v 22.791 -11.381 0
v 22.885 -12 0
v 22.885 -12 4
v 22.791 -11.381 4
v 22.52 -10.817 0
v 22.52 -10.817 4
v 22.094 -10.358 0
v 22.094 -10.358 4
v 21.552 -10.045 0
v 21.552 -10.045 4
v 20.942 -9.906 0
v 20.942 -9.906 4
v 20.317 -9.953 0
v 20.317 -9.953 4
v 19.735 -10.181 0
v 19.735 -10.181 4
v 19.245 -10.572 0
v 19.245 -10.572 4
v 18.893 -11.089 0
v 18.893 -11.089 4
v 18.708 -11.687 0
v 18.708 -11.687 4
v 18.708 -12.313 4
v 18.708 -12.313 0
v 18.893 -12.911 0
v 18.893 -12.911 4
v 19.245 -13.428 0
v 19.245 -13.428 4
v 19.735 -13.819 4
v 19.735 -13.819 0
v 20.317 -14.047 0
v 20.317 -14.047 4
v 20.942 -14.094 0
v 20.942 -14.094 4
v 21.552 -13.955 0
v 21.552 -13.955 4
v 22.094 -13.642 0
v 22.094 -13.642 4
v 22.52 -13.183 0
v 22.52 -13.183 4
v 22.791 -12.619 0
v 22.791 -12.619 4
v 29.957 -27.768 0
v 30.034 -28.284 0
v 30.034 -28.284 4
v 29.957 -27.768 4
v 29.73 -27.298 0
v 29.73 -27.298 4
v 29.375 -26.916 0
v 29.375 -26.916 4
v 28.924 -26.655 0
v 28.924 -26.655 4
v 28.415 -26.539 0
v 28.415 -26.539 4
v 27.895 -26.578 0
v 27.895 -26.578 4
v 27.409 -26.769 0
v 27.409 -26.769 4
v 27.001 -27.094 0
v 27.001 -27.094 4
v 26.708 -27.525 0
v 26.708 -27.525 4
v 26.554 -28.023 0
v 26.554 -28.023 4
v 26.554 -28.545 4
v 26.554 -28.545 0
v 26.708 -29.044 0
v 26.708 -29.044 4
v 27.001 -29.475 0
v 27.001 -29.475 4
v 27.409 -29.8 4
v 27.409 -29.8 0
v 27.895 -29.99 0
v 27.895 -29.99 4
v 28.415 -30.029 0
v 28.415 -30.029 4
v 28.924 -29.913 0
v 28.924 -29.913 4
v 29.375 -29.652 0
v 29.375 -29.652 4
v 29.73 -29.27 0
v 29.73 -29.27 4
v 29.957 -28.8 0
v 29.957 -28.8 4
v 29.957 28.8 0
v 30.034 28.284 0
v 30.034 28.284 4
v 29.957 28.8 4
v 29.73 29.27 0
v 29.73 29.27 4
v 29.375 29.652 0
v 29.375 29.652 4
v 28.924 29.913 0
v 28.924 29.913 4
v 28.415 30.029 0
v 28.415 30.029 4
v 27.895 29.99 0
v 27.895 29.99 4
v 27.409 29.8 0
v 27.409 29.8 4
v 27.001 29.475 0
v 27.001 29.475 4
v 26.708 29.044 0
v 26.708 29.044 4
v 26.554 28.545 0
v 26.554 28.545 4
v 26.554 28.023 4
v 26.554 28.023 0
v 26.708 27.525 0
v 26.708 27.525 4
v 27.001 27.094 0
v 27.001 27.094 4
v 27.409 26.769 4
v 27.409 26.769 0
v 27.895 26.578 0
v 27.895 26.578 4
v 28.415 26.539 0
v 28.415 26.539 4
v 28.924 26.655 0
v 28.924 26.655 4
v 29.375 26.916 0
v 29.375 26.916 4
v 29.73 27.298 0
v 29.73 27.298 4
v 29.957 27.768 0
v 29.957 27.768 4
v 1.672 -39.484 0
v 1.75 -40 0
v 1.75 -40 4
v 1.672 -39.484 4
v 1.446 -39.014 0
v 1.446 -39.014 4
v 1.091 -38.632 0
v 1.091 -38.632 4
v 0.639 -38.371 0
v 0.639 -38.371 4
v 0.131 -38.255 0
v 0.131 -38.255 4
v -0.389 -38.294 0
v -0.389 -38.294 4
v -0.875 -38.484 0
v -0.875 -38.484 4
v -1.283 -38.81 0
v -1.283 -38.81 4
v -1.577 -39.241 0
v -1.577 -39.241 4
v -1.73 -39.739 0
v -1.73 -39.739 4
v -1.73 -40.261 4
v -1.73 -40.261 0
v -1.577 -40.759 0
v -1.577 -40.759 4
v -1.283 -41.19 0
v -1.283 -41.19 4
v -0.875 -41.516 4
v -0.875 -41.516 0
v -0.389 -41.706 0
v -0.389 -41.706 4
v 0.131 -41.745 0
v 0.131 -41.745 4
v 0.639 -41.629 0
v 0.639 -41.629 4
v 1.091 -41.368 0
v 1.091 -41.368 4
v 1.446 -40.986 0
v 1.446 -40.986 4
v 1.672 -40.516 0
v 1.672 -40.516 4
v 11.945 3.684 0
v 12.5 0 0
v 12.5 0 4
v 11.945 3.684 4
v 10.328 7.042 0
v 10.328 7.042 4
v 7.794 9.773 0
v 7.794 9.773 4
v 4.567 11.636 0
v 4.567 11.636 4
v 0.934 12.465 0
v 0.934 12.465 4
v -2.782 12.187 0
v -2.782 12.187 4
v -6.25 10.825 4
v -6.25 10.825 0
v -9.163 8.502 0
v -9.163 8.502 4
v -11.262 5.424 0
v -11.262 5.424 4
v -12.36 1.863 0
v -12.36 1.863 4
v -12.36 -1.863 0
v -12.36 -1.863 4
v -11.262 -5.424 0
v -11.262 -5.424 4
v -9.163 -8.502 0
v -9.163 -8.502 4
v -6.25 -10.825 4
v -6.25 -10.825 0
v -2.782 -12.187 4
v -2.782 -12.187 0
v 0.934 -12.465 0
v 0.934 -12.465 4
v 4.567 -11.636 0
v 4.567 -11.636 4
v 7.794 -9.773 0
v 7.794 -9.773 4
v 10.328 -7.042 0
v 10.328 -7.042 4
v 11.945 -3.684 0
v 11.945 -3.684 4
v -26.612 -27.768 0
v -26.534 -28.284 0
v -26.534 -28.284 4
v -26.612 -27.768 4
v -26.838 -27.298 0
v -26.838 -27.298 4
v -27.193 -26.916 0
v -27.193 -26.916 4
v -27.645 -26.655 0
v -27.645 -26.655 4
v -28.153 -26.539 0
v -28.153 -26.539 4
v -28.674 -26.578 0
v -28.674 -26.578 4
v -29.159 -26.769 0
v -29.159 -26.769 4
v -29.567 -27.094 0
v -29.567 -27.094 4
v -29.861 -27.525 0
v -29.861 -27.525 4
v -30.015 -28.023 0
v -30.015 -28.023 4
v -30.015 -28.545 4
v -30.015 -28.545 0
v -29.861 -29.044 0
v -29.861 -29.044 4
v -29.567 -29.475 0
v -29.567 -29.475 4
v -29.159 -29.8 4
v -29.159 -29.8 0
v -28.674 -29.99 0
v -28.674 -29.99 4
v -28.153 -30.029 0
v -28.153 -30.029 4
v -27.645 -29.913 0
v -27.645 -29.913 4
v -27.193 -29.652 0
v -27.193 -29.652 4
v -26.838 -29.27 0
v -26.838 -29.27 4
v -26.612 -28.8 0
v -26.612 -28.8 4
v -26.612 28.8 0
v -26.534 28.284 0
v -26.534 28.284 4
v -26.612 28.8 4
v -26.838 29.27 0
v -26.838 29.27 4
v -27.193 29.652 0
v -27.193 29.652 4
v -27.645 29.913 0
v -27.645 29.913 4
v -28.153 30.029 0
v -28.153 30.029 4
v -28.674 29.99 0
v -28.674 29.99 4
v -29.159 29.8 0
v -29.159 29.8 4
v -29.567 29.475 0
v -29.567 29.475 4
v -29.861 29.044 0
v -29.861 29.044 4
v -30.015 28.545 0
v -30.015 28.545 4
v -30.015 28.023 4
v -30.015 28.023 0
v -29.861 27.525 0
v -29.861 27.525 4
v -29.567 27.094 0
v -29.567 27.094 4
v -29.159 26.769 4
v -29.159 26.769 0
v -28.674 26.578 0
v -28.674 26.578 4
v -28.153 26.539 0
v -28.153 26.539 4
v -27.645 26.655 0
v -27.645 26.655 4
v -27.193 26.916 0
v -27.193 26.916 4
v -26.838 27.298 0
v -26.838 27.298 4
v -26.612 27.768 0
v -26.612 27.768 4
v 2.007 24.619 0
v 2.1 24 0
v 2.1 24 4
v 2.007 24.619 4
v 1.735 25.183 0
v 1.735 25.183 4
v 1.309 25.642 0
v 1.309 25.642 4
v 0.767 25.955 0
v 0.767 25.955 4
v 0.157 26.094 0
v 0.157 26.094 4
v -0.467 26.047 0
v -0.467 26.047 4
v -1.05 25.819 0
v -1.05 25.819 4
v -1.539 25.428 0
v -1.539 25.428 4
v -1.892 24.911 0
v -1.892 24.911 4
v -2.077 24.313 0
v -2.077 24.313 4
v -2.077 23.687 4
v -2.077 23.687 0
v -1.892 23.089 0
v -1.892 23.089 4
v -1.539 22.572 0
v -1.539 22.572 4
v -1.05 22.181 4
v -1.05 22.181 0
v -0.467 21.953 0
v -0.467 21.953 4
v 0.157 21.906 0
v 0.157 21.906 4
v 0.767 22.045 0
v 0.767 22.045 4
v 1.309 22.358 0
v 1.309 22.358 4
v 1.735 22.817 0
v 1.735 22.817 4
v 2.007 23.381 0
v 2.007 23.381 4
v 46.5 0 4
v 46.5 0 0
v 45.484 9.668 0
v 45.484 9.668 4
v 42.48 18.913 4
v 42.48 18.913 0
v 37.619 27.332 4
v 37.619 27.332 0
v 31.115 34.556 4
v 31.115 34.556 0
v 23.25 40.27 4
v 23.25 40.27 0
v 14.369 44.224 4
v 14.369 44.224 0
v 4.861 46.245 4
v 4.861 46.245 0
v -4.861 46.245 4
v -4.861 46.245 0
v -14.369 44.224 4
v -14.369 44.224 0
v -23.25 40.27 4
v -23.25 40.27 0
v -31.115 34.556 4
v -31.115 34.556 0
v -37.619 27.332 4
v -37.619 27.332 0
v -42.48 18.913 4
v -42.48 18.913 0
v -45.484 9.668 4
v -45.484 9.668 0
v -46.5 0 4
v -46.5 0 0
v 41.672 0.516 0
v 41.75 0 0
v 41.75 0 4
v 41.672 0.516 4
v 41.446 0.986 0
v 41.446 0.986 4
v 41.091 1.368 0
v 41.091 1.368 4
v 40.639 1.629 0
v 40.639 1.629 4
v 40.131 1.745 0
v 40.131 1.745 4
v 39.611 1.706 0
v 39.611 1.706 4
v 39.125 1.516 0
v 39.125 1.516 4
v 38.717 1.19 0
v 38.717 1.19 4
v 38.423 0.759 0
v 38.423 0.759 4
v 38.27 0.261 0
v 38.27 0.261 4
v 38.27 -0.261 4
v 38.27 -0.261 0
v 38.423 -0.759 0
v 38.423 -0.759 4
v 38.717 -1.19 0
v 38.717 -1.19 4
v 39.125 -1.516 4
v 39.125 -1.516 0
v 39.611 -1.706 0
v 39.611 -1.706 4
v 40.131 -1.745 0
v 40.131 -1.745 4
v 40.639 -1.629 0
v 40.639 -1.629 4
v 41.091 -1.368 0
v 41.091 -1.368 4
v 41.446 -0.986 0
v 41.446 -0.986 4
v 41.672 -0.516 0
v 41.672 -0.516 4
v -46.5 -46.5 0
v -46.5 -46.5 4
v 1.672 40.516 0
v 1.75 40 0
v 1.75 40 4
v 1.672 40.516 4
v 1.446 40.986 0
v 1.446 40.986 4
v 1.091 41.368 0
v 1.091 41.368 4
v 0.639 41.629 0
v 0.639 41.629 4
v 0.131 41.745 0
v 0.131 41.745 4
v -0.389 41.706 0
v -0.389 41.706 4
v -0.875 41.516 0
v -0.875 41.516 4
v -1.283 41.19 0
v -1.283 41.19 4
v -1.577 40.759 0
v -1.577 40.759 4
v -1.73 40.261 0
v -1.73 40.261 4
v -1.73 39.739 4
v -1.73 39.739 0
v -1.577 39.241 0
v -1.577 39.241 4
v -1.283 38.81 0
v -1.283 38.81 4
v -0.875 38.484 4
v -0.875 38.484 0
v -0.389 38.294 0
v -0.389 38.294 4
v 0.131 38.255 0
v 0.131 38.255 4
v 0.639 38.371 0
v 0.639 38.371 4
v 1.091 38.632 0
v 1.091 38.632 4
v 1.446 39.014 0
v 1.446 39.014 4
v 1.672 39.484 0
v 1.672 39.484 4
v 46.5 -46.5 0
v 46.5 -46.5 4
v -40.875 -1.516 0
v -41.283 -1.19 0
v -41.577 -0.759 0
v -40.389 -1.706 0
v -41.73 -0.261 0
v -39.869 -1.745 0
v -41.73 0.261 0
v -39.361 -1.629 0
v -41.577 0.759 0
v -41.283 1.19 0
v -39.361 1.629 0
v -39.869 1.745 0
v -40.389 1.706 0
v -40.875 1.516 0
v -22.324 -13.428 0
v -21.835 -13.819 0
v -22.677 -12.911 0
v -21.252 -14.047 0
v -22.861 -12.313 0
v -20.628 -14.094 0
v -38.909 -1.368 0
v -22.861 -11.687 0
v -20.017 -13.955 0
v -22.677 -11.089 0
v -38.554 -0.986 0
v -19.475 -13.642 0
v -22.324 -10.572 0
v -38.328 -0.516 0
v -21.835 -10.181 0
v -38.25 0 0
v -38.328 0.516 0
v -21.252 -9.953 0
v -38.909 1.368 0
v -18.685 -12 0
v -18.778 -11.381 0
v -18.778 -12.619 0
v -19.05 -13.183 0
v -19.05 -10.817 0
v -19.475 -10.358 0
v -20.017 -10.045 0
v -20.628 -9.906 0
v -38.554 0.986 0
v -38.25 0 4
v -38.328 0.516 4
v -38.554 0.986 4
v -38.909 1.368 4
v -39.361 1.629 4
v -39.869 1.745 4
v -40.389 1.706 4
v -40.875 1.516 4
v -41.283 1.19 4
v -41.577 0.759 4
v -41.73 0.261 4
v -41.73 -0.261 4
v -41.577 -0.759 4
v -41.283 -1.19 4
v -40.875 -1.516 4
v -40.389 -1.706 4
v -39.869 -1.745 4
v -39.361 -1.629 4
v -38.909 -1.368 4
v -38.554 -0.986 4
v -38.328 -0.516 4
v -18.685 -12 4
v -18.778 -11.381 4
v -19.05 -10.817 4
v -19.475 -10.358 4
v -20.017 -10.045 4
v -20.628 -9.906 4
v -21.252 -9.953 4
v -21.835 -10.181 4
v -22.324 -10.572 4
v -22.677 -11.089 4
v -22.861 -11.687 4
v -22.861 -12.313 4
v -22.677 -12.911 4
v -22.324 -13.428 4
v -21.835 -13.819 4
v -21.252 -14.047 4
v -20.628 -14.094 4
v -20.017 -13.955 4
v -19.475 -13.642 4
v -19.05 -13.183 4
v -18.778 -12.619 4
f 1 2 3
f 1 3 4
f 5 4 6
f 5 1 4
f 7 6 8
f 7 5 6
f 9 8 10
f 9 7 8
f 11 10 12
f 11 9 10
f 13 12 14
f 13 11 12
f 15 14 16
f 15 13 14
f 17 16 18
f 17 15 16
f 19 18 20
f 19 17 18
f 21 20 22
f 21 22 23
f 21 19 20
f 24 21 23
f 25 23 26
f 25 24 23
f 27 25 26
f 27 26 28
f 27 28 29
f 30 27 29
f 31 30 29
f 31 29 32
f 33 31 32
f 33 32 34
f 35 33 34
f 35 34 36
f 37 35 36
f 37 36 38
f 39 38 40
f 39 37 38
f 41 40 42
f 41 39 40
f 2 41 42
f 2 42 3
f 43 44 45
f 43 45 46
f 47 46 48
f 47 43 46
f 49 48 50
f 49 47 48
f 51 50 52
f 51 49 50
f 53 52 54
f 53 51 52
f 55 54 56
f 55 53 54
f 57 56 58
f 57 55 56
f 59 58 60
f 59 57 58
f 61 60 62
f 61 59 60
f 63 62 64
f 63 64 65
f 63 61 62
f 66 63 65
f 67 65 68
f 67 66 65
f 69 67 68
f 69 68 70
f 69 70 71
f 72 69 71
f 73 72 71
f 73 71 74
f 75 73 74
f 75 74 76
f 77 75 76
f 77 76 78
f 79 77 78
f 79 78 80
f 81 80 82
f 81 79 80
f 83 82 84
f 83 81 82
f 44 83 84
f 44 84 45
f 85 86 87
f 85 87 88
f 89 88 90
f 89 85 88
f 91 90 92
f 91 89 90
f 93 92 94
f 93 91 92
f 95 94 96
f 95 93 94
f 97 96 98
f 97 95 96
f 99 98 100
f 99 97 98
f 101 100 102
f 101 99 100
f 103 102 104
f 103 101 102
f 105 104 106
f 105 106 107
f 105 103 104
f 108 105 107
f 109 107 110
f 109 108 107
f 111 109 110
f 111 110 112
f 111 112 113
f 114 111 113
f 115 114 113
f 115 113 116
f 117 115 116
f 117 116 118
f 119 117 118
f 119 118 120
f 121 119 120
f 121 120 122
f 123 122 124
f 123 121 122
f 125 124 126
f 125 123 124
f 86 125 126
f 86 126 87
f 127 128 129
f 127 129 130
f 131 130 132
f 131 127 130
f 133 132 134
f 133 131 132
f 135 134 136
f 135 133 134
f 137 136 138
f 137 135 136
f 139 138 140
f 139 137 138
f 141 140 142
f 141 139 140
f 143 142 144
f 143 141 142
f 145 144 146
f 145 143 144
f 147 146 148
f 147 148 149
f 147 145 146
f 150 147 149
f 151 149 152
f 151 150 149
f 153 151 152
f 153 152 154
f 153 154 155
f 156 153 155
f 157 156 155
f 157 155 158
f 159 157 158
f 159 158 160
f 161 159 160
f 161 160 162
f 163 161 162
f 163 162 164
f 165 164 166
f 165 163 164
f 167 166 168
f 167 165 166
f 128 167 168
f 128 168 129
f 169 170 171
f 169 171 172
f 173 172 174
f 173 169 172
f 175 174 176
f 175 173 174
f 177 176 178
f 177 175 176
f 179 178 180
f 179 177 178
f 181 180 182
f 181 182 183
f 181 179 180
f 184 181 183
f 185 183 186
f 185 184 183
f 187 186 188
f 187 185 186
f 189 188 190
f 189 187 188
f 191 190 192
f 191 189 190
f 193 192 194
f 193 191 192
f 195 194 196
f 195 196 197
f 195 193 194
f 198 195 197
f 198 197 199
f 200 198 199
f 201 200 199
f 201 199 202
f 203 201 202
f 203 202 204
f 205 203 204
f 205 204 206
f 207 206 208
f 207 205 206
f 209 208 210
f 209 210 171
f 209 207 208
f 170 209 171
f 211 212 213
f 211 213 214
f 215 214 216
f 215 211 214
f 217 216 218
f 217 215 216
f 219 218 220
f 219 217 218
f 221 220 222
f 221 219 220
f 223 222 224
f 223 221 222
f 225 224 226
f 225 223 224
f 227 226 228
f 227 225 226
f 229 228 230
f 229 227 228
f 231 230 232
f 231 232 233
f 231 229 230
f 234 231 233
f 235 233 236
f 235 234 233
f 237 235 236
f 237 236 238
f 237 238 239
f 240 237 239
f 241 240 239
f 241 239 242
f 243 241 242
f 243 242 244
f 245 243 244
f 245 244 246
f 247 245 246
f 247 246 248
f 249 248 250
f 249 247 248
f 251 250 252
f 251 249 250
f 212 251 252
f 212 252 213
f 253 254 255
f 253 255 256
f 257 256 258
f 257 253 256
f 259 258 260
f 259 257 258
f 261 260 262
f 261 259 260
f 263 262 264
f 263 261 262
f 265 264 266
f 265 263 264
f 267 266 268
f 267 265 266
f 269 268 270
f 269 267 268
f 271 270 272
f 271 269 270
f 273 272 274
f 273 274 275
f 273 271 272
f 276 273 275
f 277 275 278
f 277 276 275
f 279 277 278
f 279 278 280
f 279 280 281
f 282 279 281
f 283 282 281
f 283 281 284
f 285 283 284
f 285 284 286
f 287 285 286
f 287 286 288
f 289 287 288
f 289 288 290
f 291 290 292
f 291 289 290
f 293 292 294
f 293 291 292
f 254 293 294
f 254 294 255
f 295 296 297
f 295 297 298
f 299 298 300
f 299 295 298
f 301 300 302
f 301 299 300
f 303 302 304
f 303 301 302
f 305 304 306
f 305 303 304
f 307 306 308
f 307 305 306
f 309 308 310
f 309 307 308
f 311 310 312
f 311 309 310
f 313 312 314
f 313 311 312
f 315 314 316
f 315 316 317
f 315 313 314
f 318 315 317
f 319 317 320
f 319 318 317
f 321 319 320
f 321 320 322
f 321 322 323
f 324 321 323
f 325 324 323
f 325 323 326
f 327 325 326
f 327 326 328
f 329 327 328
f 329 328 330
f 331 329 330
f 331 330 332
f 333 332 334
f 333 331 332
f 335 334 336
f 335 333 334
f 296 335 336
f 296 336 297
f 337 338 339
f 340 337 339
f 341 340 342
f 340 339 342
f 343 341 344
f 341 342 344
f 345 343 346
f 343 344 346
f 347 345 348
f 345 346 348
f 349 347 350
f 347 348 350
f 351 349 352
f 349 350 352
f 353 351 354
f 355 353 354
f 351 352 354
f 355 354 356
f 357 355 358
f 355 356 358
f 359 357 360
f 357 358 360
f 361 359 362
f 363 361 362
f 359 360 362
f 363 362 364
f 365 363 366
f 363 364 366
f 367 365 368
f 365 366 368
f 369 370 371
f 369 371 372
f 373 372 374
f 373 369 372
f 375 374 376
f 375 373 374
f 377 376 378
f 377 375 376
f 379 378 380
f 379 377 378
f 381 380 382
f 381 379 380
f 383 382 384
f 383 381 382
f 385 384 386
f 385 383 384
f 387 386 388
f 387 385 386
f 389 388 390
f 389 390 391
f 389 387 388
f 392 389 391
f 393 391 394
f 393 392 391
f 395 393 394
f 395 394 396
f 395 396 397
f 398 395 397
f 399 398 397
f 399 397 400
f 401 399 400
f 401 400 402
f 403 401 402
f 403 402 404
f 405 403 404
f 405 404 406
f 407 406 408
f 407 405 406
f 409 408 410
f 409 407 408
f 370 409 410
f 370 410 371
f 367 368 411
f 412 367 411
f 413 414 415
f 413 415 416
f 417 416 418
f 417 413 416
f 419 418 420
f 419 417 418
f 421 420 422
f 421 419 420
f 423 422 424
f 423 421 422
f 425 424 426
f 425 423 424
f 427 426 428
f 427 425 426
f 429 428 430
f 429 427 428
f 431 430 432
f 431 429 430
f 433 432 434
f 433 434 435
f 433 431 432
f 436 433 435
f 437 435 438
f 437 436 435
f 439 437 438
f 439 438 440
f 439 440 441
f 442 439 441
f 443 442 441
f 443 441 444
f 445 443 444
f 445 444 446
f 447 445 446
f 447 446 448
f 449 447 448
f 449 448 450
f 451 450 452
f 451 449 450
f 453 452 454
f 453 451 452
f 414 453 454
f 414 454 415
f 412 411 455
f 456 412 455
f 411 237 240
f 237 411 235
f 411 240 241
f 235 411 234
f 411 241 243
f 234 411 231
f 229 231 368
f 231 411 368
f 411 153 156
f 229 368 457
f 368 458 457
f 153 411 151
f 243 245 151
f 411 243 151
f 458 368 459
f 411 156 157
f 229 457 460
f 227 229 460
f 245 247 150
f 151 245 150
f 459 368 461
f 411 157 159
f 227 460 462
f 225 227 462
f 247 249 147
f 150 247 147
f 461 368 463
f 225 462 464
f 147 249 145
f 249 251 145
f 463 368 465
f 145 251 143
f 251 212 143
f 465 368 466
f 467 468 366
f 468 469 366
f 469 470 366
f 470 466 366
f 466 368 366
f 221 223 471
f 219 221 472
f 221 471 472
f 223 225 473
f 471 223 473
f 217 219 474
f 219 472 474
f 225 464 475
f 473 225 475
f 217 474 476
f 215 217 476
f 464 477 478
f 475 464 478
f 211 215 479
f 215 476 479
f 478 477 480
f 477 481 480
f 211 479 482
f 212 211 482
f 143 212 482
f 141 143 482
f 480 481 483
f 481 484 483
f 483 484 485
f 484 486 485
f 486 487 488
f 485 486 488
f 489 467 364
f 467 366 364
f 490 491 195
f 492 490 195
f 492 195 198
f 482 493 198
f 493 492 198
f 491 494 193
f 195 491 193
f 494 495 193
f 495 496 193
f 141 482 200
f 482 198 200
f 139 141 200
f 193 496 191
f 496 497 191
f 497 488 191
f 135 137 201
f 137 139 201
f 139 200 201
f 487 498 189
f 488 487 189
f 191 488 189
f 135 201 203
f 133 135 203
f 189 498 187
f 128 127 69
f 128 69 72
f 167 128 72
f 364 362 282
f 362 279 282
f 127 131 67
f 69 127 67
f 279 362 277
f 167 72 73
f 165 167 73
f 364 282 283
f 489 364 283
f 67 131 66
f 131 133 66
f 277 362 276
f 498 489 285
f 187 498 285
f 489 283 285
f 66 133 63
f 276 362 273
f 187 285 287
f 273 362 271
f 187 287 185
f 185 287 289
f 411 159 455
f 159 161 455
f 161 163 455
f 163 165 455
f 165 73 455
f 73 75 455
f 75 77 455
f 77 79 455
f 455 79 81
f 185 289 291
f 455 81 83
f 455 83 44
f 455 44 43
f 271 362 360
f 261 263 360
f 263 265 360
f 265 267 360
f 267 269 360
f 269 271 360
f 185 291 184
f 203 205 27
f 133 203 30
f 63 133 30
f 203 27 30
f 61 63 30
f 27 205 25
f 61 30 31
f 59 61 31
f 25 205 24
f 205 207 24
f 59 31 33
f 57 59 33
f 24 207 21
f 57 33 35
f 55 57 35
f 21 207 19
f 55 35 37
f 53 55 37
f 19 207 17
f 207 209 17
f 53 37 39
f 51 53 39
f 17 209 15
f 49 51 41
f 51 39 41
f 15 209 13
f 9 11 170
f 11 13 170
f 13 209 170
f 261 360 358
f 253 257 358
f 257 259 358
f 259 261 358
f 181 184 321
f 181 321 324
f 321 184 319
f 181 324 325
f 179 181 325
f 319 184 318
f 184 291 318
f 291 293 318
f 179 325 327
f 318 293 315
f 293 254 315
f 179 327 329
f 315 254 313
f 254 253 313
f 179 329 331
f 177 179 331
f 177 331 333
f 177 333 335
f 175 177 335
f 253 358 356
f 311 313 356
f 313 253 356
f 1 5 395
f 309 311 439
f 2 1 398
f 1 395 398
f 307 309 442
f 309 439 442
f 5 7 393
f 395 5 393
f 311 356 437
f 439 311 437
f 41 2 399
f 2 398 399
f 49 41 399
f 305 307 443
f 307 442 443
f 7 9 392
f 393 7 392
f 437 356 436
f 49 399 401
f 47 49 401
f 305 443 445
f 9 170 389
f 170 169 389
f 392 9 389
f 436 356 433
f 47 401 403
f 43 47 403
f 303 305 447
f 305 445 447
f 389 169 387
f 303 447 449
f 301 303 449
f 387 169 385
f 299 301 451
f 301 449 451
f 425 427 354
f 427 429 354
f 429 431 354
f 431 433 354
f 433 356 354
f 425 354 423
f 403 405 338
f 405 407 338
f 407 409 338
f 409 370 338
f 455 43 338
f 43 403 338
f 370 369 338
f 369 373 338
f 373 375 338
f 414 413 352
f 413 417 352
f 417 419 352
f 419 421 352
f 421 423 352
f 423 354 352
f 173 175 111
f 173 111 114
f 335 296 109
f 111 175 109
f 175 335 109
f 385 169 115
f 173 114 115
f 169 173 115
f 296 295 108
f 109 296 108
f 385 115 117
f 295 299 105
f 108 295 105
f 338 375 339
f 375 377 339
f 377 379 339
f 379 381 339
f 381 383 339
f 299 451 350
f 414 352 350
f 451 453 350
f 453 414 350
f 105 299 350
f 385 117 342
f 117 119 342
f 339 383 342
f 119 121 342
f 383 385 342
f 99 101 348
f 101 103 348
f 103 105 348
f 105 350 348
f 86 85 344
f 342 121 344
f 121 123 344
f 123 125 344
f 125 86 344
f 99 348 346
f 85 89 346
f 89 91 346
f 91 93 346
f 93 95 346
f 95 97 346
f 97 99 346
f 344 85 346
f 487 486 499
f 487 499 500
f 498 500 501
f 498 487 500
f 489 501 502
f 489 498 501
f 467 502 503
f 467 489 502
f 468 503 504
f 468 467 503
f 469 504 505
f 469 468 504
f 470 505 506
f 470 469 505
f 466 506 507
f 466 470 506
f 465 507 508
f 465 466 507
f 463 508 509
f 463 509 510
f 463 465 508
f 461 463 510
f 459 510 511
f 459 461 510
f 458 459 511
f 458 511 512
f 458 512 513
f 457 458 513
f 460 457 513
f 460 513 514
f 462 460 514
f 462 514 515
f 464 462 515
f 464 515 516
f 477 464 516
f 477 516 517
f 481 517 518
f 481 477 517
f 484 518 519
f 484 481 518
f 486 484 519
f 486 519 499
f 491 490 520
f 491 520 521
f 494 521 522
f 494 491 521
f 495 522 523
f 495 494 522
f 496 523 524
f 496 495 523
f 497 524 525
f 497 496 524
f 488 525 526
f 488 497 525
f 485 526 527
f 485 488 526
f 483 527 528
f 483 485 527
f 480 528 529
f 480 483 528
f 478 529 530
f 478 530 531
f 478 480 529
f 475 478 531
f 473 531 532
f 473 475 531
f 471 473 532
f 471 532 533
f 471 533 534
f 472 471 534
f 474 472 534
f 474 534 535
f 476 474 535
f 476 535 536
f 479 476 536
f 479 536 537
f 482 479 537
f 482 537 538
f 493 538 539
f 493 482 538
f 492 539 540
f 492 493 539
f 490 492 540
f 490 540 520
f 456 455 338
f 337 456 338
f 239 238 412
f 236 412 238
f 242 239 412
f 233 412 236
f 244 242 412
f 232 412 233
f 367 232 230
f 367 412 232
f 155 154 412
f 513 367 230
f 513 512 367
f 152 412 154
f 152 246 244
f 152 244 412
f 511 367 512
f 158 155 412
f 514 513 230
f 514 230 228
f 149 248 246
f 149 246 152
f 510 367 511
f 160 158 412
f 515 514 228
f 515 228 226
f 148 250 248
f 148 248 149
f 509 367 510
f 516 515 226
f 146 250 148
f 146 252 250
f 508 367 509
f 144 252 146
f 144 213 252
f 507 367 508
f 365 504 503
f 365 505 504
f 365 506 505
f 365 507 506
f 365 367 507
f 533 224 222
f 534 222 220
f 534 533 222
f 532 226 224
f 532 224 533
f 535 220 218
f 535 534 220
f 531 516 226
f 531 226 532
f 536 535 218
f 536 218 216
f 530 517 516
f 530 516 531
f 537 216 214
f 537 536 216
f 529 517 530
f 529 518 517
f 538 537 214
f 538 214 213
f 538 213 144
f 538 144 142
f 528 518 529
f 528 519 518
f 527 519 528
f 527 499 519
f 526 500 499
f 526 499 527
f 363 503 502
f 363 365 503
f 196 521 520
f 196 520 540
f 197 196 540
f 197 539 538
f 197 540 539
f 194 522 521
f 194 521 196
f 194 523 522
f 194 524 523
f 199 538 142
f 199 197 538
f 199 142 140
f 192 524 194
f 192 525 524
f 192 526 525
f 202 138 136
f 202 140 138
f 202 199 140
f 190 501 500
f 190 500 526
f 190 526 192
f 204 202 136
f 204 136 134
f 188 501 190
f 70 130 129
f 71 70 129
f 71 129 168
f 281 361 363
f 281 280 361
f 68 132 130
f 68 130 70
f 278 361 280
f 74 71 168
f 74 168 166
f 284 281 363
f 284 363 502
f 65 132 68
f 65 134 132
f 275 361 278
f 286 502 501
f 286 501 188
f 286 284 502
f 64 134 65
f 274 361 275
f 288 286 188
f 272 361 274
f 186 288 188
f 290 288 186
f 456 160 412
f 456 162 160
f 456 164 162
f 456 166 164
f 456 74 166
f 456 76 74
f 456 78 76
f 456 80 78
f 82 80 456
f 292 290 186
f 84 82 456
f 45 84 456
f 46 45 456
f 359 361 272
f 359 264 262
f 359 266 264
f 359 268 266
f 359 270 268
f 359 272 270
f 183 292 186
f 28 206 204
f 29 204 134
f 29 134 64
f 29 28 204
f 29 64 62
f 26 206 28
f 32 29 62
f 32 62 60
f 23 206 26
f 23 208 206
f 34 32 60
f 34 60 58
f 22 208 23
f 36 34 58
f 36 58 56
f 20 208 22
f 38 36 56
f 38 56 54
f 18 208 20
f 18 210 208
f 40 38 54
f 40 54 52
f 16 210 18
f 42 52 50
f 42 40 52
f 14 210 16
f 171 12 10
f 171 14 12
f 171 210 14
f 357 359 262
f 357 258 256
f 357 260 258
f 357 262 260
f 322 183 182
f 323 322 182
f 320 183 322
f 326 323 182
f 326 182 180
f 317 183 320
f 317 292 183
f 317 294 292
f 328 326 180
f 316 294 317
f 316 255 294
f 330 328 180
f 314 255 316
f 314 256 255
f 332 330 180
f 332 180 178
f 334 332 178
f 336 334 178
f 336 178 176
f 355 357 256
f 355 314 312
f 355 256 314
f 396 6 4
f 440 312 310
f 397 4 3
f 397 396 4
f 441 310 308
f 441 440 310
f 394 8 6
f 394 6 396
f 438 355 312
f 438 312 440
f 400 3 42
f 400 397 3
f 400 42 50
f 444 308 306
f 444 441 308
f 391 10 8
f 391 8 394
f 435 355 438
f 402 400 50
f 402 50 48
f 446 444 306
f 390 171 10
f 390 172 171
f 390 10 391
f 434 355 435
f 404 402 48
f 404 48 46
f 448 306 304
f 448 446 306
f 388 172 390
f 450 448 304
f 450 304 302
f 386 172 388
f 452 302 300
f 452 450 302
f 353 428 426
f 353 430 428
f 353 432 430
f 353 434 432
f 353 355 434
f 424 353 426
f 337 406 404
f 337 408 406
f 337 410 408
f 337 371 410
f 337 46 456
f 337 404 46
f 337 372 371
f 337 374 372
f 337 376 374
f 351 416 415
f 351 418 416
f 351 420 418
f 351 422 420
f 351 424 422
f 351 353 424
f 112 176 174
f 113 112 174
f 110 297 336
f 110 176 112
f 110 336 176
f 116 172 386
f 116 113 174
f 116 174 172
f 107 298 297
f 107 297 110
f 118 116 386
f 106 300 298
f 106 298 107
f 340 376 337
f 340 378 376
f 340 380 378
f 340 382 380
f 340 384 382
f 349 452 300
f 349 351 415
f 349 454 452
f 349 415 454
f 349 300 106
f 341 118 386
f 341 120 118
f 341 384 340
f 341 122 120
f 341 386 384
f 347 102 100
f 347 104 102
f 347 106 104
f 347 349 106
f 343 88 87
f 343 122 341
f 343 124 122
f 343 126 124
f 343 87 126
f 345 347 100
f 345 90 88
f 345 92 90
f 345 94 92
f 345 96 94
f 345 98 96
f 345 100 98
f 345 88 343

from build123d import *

# Parameters (mm, degrees)
SKETCH1_R           = 2.1
SKETCH1_R_2         = 12.5
SKETCH1_R_3         = 1.75
BOSS_EXTRUDE1_DEPTH = 4


with BuildPart() as part:
    # Sketch1 → Boss-Extrude1 (new body)
    with BuildSketch(Plane.XY):
        with BuildLine():
            Line((-46.5, 0), (-46.5, -46.5))
            Line((-46.5, -46.5), (46.5, -46.5))
            Line((46.5, -46.5), (46.5, 0))
            ThreePointArc((46.5, 0), (0, 46.5), (-46.5, 0))
        make_face()
        with Locations((0, 24)):
            Circle(SKETCH1_R, mode=Mode.SUBTRACT)
        with Locations((-20.784609691, -12)):
            Circle(SKETCH1_R, mode=Mode.SUBTRACT)
        with Locations((20.784609691, -12)):
            Circle(SKETCH1_R, mode=Mode.SUBTRACT)
        Circle(SKETCH1_R_2, mode=Mode.SUBTRACT)
        with Locations((0, 40)):
            Circle(SKETCH1_R_3, mode=Mode.SUBTRACT)
        with Locations((28.284271247, 28.284271247)):
            Circle(SKETCH1_R_3, mode=Mode.SUBTRACT)
        with Locations((40, 0)):
            Circle(SKETCH1_R_3, mode=Mode.SUBTRACT)
        with Locations((28.284271247, -28.284271247)):
            Circle(SKETCH1_R_3, mode=Mode.SUBTRACT)
        with Locations((0, -40)):
            Circle(SKETCH1_R_3, mode=Mode.SUBTRACT)
        with Locations((-28.284271247, -28.284271247)):
            Circle(SKETCH1_R_3, mode=Mode.SUBTRACT)
        with Locations((-40, 0)):
            Circle(SKETCH1_R_3, mode=Mode.SUBTRACT)
        with Locations((-28.284271247, 28.284271247)):
            Circle(SKETCH1_R_3, mode=Mode.SUBTRACT)
    extrude(amount=BOSS_EXTRUDE1_DEPTH)


solid = part.part
